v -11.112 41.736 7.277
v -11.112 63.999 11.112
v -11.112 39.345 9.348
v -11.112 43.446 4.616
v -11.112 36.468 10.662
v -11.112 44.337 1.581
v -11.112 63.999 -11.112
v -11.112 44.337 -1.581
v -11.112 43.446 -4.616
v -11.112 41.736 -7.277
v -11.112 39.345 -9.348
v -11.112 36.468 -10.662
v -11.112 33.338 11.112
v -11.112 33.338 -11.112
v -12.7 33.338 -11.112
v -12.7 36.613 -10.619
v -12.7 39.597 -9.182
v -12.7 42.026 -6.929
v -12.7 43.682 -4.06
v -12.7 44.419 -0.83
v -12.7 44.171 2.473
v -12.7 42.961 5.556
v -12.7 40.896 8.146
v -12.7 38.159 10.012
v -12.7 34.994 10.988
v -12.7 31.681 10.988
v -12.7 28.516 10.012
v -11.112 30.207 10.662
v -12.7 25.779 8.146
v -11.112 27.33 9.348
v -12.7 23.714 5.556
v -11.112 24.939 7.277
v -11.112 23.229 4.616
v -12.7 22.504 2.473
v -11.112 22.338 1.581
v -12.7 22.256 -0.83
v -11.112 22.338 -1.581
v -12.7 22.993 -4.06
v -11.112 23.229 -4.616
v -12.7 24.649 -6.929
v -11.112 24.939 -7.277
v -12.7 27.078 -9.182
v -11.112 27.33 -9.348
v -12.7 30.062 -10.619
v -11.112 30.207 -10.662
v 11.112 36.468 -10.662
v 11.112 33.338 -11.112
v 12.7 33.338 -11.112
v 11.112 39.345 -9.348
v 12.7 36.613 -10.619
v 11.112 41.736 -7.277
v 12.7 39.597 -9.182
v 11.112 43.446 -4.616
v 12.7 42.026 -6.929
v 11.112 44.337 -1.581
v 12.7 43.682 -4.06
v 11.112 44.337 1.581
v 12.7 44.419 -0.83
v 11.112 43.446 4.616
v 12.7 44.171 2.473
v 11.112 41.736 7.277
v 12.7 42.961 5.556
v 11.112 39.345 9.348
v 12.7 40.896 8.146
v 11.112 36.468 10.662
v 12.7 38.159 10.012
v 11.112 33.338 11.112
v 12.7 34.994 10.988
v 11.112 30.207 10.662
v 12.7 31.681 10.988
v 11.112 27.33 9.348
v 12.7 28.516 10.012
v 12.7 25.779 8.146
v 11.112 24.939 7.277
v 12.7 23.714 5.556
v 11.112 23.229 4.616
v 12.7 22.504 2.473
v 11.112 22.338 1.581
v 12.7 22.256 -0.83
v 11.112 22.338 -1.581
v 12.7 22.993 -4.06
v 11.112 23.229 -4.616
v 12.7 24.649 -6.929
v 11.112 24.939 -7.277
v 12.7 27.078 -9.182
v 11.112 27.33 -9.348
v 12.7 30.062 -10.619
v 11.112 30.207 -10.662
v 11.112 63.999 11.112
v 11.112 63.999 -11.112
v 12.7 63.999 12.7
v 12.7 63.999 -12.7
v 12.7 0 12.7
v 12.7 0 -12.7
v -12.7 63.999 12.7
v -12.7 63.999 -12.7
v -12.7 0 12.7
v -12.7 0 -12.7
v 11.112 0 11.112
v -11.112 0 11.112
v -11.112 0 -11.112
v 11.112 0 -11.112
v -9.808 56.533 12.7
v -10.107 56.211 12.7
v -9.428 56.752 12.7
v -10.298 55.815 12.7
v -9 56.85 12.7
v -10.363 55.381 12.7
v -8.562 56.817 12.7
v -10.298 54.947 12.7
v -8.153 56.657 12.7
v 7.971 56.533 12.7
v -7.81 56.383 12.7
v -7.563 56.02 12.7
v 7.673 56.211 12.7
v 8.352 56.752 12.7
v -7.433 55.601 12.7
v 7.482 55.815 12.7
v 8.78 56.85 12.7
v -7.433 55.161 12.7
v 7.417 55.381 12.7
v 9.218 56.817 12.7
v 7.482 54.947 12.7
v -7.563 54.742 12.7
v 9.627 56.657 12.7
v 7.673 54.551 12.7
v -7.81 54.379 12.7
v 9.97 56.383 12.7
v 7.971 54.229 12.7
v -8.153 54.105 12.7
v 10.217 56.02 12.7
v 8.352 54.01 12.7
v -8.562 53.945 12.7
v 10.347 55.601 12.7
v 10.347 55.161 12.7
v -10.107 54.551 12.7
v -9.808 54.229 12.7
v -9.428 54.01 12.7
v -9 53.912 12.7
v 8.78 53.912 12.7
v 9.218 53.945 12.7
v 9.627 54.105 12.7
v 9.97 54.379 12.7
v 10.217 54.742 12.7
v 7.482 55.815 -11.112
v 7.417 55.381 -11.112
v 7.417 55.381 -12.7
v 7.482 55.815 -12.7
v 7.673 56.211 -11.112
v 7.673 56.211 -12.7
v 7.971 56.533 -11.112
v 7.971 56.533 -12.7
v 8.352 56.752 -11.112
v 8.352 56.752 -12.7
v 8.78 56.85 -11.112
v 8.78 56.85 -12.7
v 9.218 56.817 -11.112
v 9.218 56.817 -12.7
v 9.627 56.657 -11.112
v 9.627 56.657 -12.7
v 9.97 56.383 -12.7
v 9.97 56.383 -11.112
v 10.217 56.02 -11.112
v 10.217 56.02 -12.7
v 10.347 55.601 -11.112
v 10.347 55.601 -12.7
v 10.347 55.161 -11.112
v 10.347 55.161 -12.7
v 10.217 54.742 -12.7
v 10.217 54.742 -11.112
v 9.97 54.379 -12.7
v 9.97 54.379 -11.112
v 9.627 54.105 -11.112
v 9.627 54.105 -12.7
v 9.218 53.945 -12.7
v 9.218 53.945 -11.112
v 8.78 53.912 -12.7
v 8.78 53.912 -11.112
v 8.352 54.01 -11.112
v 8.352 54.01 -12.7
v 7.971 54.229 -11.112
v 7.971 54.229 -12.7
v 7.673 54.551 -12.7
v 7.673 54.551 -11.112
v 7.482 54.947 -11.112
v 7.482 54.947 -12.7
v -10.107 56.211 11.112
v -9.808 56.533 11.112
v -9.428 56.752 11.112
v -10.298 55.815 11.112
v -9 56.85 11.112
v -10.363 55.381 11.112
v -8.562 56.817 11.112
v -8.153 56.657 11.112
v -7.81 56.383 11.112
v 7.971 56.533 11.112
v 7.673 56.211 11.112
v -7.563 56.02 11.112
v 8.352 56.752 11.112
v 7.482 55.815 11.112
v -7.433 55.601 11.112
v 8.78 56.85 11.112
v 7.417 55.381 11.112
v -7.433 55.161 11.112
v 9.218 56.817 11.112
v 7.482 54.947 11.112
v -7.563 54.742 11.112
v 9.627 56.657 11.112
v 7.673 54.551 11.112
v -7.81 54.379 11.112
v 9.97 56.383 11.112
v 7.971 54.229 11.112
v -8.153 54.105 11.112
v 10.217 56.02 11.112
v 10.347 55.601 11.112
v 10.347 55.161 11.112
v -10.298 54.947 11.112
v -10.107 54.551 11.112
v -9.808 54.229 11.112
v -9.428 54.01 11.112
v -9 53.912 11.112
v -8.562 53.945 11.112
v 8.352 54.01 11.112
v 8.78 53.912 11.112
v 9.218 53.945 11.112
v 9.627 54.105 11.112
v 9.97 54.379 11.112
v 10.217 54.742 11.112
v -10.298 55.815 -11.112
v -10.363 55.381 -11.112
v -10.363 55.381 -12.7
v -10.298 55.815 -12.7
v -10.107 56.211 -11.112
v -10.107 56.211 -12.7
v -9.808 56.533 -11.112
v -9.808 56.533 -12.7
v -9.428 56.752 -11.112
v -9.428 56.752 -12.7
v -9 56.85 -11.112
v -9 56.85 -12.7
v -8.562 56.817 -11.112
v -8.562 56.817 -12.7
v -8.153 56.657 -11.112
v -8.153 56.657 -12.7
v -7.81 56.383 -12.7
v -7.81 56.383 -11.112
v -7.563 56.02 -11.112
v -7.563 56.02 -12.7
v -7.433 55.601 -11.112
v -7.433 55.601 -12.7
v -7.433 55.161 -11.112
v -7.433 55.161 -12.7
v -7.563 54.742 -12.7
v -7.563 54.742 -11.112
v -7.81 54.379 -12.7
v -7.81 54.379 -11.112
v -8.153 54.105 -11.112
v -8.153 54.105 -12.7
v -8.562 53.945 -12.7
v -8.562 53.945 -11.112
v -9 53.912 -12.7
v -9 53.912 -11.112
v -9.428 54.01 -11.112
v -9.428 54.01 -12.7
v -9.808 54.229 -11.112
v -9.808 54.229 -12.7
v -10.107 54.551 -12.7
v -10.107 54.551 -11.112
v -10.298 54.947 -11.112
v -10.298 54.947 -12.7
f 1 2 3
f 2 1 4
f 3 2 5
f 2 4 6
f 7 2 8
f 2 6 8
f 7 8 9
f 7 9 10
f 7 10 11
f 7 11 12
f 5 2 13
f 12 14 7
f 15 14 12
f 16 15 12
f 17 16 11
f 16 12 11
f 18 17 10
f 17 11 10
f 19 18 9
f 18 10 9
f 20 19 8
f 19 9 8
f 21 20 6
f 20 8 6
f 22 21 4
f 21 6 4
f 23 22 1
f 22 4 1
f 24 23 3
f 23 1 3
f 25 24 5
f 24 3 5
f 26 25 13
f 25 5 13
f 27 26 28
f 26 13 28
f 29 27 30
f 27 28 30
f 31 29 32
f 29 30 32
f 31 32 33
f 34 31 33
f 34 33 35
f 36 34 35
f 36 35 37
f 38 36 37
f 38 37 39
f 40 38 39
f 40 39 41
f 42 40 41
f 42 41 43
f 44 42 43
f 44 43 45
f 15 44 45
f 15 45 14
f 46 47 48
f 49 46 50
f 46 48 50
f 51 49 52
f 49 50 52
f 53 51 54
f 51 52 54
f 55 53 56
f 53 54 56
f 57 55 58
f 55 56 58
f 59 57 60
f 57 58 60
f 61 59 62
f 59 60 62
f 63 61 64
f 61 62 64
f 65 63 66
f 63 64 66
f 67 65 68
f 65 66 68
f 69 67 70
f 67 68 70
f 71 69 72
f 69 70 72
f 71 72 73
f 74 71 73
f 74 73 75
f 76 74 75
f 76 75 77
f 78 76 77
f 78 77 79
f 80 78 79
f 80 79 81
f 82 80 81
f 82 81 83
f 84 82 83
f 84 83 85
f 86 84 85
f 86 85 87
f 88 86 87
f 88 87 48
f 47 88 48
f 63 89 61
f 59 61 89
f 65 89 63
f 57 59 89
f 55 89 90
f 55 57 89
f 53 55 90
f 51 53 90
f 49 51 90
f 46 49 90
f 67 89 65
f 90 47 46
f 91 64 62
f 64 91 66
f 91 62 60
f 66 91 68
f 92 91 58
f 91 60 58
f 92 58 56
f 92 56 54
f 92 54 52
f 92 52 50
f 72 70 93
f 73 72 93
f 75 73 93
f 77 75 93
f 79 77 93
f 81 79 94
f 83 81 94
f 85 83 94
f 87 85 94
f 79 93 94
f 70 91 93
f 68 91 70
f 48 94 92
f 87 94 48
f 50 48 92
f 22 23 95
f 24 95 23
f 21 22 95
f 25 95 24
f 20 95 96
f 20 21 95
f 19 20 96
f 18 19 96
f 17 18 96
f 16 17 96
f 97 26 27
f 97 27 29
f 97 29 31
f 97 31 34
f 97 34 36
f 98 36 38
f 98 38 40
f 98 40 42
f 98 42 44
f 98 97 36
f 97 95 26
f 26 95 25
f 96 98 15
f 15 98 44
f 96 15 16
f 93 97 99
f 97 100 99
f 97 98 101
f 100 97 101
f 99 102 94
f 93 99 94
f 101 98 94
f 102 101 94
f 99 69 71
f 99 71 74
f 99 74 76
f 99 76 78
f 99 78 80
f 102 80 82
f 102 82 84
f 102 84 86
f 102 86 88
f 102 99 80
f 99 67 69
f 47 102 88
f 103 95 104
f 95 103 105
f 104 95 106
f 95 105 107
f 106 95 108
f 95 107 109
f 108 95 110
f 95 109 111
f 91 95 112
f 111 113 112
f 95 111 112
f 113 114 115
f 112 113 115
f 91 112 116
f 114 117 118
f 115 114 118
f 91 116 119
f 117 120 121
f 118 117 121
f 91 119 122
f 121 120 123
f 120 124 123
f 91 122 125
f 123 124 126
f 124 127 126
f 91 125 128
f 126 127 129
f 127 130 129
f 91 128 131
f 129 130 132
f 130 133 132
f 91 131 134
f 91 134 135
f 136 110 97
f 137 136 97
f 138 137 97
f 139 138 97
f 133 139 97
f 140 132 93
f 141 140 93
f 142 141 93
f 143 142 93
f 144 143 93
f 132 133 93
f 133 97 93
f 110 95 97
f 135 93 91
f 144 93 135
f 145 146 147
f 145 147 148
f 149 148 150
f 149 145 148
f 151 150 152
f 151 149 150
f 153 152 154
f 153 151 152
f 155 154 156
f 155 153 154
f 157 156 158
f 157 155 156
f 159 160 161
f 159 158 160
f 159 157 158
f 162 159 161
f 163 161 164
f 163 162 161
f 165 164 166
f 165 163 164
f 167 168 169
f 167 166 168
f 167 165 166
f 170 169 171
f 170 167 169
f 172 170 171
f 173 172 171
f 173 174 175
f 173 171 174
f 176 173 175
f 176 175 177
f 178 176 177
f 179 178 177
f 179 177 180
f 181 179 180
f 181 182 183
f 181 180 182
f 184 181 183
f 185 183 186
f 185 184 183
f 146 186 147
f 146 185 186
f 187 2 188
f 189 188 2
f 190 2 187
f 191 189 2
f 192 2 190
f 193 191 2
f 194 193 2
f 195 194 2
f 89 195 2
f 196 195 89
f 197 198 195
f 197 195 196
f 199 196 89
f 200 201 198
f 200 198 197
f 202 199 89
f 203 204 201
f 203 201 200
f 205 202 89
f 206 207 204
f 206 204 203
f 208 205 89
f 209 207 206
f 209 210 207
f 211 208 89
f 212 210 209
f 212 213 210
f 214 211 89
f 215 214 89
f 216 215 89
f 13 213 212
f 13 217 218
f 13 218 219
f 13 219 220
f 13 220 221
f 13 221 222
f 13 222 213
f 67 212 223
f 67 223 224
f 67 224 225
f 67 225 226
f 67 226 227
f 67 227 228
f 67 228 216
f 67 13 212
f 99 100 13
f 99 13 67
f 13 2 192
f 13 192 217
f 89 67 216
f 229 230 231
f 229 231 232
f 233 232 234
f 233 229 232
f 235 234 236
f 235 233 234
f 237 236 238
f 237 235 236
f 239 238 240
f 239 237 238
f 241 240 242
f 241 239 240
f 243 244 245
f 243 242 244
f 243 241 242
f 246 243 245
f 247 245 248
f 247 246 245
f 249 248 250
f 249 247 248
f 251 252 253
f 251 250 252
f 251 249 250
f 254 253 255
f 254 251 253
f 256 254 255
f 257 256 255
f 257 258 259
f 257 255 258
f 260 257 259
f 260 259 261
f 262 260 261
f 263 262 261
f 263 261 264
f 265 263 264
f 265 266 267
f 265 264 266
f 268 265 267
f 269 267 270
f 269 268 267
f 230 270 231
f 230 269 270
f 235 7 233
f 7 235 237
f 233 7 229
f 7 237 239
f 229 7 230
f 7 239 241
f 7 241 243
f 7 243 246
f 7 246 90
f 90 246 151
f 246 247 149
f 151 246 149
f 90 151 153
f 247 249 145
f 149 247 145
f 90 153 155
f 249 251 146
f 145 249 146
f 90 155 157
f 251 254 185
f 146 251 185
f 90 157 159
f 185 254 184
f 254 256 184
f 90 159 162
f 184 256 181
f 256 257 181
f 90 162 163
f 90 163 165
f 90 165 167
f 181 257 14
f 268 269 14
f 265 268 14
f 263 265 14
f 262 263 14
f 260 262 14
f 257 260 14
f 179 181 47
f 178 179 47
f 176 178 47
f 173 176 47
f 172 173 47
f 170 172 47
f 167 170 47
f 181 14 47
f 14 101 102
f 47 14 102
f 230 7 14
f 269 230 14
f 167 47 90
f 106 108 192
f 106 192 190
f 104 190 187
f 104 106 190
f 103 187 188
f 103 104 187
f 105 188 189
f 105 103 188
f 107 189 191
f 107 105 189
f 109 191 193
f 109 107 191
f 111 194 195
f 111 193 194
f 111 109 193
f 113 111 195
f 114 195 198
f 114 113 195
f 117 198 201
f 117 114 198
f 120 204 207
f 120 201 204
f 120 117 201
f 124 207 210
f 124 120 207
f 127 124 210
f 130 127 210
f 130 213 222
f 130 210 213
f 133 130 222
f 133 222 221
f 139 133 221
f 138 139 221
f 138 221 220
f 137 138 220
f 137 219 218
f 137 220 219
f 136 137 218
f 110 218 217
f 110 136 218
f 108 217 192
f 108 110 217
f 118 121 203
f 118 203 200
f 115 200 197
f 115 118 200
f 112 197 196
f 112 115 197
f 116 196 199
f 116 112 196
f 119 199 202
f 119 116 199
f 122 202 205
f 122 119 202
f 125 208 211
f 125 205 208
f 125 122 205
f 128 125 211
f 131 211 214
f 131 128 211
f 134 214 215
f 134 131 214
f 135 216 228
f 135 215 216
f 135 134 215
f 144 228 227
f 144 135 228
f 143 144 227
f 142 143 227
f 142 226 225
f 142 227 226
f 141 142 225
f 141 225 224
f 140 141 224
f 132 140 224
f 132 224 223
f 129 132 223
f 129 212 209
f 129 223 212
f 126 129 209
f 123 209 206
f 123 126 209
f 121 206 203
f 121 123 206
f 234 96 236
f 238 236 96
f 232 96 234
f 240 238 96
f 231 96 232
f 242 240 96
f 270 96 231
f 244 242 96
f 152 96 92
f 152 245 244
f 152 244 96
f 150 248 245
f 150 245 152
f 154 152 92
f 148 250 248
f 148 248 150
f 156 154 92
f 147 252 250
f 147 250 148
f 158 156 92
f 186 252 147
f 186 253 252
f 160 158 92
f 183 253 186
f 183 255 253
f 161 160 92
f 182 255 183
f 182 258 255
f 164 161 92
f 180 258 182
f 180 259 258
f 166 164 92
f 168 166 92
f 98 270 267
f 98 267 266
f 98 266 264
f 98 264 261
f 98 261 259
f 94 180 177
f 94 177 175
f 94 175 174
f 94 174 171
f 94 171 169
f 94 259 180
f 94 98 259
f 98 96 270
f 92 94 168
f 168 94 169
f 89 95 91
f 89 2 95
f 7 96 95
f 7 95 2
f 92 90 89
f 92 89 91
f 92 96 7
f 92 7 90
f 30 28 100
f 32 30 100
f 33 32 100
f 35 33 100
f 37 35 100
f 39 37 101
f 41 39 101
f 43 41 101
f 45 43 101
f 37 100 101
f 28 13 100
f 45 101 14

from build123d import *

# Parameters (mm, degrees)
SKETCH1_W               = 25.4
SKETCH1_H               = 25.4
SKETCH1_W_2             = 22.225
SKETCH1_H_2             = 22.225
BOSS_EXTRUDE1_DEPTH     = 63.99895
SKETCH3_R               = 11.1125
CUT_EXTRUDE2_DEPTH      = 71.016538054
CUT_EXTRUDE3_DEPTH      = 71.016538054
CUT_EXTRUDE3_DEPTH_BACK = 71.016538054
SKETCH6_R               = 1.4732
CUT_EXTRUDE4_DEPTH      = 71.016538054
CUT_EXTRUDE4_DEPTH_BACK = 71.016538054
SKETCH7_R               = 1.4732


with BuildPart() as part:
    # Sketch1 → Boss-Extrude1 (new body)
    with BuildSketch(Plane(origin=(0, 0, 0), x_dir=(1, 0, 0), z_dir=(0, 1, 0))):
        Rectangle(SKETCH1_W, SKETCH1_H)
        Rectangle(SKETCH1_W_2, SKETCH1_H_2, mode=Mode.SUBTRACT)
    extrude(amount=BOSS_EXTRUDE1_DEPTH)

    # Sketch3 → Cut-Extrude2 (cut, through all)
    with BuildSketch(Plane(origin=(12.7, 0, 0), x_dir=(0, 0, -1), z_dir=(1, 0, 0))):
        with Locations((0, 33.3375)):
            Circle(SKETCH3_R)
    extrude(amount=-CUT_EXTRUDE2_DEPTH, mode=Mode.SUBTRACT)

    # Sketch6 → Cut-Extrude3 (cut, two sides: drawn at the far end of the back side and taken through both)
    with BuildSketch(Plane(origin=(0, 0, -12.7), x_dir=(-1, 0, 0), z_dir=(0, 0, -1)).offset(-CUT_EXTRUDE3_DEPTH_BACK)):
        with Locations((8.889941847, 55.381049815)):
            Circle(SKETCH6_R)
    extrude(amount=CUT_EXTRUDE3_DEPTH + CUT_EXTRUDE3_DEPTH_BACK, mode=Mode.SUBTRACT)

    # Sketch7 → Cut-Extrude4 (cut, two sides: drawn at the far end of the back side and taken through both)
    with BuildSketch(Plane(origin=(0, 0, -12.7), x_dir=(-1, 0, 0), z_dir=(0, 0, -1)).offset(-CUT_EXTRUDE4_DEPTH_BACK)):
        with Locations((-8.889941847, 55.381049816)):
            Circle(SKETCH7_R)
    extrude(amount=CUT_EXTRUDE4_DEPTH + CUT_EXTRUDE4_DEPTH_BACK, mode=Mode.SUBTRACT)


solid = part.part
